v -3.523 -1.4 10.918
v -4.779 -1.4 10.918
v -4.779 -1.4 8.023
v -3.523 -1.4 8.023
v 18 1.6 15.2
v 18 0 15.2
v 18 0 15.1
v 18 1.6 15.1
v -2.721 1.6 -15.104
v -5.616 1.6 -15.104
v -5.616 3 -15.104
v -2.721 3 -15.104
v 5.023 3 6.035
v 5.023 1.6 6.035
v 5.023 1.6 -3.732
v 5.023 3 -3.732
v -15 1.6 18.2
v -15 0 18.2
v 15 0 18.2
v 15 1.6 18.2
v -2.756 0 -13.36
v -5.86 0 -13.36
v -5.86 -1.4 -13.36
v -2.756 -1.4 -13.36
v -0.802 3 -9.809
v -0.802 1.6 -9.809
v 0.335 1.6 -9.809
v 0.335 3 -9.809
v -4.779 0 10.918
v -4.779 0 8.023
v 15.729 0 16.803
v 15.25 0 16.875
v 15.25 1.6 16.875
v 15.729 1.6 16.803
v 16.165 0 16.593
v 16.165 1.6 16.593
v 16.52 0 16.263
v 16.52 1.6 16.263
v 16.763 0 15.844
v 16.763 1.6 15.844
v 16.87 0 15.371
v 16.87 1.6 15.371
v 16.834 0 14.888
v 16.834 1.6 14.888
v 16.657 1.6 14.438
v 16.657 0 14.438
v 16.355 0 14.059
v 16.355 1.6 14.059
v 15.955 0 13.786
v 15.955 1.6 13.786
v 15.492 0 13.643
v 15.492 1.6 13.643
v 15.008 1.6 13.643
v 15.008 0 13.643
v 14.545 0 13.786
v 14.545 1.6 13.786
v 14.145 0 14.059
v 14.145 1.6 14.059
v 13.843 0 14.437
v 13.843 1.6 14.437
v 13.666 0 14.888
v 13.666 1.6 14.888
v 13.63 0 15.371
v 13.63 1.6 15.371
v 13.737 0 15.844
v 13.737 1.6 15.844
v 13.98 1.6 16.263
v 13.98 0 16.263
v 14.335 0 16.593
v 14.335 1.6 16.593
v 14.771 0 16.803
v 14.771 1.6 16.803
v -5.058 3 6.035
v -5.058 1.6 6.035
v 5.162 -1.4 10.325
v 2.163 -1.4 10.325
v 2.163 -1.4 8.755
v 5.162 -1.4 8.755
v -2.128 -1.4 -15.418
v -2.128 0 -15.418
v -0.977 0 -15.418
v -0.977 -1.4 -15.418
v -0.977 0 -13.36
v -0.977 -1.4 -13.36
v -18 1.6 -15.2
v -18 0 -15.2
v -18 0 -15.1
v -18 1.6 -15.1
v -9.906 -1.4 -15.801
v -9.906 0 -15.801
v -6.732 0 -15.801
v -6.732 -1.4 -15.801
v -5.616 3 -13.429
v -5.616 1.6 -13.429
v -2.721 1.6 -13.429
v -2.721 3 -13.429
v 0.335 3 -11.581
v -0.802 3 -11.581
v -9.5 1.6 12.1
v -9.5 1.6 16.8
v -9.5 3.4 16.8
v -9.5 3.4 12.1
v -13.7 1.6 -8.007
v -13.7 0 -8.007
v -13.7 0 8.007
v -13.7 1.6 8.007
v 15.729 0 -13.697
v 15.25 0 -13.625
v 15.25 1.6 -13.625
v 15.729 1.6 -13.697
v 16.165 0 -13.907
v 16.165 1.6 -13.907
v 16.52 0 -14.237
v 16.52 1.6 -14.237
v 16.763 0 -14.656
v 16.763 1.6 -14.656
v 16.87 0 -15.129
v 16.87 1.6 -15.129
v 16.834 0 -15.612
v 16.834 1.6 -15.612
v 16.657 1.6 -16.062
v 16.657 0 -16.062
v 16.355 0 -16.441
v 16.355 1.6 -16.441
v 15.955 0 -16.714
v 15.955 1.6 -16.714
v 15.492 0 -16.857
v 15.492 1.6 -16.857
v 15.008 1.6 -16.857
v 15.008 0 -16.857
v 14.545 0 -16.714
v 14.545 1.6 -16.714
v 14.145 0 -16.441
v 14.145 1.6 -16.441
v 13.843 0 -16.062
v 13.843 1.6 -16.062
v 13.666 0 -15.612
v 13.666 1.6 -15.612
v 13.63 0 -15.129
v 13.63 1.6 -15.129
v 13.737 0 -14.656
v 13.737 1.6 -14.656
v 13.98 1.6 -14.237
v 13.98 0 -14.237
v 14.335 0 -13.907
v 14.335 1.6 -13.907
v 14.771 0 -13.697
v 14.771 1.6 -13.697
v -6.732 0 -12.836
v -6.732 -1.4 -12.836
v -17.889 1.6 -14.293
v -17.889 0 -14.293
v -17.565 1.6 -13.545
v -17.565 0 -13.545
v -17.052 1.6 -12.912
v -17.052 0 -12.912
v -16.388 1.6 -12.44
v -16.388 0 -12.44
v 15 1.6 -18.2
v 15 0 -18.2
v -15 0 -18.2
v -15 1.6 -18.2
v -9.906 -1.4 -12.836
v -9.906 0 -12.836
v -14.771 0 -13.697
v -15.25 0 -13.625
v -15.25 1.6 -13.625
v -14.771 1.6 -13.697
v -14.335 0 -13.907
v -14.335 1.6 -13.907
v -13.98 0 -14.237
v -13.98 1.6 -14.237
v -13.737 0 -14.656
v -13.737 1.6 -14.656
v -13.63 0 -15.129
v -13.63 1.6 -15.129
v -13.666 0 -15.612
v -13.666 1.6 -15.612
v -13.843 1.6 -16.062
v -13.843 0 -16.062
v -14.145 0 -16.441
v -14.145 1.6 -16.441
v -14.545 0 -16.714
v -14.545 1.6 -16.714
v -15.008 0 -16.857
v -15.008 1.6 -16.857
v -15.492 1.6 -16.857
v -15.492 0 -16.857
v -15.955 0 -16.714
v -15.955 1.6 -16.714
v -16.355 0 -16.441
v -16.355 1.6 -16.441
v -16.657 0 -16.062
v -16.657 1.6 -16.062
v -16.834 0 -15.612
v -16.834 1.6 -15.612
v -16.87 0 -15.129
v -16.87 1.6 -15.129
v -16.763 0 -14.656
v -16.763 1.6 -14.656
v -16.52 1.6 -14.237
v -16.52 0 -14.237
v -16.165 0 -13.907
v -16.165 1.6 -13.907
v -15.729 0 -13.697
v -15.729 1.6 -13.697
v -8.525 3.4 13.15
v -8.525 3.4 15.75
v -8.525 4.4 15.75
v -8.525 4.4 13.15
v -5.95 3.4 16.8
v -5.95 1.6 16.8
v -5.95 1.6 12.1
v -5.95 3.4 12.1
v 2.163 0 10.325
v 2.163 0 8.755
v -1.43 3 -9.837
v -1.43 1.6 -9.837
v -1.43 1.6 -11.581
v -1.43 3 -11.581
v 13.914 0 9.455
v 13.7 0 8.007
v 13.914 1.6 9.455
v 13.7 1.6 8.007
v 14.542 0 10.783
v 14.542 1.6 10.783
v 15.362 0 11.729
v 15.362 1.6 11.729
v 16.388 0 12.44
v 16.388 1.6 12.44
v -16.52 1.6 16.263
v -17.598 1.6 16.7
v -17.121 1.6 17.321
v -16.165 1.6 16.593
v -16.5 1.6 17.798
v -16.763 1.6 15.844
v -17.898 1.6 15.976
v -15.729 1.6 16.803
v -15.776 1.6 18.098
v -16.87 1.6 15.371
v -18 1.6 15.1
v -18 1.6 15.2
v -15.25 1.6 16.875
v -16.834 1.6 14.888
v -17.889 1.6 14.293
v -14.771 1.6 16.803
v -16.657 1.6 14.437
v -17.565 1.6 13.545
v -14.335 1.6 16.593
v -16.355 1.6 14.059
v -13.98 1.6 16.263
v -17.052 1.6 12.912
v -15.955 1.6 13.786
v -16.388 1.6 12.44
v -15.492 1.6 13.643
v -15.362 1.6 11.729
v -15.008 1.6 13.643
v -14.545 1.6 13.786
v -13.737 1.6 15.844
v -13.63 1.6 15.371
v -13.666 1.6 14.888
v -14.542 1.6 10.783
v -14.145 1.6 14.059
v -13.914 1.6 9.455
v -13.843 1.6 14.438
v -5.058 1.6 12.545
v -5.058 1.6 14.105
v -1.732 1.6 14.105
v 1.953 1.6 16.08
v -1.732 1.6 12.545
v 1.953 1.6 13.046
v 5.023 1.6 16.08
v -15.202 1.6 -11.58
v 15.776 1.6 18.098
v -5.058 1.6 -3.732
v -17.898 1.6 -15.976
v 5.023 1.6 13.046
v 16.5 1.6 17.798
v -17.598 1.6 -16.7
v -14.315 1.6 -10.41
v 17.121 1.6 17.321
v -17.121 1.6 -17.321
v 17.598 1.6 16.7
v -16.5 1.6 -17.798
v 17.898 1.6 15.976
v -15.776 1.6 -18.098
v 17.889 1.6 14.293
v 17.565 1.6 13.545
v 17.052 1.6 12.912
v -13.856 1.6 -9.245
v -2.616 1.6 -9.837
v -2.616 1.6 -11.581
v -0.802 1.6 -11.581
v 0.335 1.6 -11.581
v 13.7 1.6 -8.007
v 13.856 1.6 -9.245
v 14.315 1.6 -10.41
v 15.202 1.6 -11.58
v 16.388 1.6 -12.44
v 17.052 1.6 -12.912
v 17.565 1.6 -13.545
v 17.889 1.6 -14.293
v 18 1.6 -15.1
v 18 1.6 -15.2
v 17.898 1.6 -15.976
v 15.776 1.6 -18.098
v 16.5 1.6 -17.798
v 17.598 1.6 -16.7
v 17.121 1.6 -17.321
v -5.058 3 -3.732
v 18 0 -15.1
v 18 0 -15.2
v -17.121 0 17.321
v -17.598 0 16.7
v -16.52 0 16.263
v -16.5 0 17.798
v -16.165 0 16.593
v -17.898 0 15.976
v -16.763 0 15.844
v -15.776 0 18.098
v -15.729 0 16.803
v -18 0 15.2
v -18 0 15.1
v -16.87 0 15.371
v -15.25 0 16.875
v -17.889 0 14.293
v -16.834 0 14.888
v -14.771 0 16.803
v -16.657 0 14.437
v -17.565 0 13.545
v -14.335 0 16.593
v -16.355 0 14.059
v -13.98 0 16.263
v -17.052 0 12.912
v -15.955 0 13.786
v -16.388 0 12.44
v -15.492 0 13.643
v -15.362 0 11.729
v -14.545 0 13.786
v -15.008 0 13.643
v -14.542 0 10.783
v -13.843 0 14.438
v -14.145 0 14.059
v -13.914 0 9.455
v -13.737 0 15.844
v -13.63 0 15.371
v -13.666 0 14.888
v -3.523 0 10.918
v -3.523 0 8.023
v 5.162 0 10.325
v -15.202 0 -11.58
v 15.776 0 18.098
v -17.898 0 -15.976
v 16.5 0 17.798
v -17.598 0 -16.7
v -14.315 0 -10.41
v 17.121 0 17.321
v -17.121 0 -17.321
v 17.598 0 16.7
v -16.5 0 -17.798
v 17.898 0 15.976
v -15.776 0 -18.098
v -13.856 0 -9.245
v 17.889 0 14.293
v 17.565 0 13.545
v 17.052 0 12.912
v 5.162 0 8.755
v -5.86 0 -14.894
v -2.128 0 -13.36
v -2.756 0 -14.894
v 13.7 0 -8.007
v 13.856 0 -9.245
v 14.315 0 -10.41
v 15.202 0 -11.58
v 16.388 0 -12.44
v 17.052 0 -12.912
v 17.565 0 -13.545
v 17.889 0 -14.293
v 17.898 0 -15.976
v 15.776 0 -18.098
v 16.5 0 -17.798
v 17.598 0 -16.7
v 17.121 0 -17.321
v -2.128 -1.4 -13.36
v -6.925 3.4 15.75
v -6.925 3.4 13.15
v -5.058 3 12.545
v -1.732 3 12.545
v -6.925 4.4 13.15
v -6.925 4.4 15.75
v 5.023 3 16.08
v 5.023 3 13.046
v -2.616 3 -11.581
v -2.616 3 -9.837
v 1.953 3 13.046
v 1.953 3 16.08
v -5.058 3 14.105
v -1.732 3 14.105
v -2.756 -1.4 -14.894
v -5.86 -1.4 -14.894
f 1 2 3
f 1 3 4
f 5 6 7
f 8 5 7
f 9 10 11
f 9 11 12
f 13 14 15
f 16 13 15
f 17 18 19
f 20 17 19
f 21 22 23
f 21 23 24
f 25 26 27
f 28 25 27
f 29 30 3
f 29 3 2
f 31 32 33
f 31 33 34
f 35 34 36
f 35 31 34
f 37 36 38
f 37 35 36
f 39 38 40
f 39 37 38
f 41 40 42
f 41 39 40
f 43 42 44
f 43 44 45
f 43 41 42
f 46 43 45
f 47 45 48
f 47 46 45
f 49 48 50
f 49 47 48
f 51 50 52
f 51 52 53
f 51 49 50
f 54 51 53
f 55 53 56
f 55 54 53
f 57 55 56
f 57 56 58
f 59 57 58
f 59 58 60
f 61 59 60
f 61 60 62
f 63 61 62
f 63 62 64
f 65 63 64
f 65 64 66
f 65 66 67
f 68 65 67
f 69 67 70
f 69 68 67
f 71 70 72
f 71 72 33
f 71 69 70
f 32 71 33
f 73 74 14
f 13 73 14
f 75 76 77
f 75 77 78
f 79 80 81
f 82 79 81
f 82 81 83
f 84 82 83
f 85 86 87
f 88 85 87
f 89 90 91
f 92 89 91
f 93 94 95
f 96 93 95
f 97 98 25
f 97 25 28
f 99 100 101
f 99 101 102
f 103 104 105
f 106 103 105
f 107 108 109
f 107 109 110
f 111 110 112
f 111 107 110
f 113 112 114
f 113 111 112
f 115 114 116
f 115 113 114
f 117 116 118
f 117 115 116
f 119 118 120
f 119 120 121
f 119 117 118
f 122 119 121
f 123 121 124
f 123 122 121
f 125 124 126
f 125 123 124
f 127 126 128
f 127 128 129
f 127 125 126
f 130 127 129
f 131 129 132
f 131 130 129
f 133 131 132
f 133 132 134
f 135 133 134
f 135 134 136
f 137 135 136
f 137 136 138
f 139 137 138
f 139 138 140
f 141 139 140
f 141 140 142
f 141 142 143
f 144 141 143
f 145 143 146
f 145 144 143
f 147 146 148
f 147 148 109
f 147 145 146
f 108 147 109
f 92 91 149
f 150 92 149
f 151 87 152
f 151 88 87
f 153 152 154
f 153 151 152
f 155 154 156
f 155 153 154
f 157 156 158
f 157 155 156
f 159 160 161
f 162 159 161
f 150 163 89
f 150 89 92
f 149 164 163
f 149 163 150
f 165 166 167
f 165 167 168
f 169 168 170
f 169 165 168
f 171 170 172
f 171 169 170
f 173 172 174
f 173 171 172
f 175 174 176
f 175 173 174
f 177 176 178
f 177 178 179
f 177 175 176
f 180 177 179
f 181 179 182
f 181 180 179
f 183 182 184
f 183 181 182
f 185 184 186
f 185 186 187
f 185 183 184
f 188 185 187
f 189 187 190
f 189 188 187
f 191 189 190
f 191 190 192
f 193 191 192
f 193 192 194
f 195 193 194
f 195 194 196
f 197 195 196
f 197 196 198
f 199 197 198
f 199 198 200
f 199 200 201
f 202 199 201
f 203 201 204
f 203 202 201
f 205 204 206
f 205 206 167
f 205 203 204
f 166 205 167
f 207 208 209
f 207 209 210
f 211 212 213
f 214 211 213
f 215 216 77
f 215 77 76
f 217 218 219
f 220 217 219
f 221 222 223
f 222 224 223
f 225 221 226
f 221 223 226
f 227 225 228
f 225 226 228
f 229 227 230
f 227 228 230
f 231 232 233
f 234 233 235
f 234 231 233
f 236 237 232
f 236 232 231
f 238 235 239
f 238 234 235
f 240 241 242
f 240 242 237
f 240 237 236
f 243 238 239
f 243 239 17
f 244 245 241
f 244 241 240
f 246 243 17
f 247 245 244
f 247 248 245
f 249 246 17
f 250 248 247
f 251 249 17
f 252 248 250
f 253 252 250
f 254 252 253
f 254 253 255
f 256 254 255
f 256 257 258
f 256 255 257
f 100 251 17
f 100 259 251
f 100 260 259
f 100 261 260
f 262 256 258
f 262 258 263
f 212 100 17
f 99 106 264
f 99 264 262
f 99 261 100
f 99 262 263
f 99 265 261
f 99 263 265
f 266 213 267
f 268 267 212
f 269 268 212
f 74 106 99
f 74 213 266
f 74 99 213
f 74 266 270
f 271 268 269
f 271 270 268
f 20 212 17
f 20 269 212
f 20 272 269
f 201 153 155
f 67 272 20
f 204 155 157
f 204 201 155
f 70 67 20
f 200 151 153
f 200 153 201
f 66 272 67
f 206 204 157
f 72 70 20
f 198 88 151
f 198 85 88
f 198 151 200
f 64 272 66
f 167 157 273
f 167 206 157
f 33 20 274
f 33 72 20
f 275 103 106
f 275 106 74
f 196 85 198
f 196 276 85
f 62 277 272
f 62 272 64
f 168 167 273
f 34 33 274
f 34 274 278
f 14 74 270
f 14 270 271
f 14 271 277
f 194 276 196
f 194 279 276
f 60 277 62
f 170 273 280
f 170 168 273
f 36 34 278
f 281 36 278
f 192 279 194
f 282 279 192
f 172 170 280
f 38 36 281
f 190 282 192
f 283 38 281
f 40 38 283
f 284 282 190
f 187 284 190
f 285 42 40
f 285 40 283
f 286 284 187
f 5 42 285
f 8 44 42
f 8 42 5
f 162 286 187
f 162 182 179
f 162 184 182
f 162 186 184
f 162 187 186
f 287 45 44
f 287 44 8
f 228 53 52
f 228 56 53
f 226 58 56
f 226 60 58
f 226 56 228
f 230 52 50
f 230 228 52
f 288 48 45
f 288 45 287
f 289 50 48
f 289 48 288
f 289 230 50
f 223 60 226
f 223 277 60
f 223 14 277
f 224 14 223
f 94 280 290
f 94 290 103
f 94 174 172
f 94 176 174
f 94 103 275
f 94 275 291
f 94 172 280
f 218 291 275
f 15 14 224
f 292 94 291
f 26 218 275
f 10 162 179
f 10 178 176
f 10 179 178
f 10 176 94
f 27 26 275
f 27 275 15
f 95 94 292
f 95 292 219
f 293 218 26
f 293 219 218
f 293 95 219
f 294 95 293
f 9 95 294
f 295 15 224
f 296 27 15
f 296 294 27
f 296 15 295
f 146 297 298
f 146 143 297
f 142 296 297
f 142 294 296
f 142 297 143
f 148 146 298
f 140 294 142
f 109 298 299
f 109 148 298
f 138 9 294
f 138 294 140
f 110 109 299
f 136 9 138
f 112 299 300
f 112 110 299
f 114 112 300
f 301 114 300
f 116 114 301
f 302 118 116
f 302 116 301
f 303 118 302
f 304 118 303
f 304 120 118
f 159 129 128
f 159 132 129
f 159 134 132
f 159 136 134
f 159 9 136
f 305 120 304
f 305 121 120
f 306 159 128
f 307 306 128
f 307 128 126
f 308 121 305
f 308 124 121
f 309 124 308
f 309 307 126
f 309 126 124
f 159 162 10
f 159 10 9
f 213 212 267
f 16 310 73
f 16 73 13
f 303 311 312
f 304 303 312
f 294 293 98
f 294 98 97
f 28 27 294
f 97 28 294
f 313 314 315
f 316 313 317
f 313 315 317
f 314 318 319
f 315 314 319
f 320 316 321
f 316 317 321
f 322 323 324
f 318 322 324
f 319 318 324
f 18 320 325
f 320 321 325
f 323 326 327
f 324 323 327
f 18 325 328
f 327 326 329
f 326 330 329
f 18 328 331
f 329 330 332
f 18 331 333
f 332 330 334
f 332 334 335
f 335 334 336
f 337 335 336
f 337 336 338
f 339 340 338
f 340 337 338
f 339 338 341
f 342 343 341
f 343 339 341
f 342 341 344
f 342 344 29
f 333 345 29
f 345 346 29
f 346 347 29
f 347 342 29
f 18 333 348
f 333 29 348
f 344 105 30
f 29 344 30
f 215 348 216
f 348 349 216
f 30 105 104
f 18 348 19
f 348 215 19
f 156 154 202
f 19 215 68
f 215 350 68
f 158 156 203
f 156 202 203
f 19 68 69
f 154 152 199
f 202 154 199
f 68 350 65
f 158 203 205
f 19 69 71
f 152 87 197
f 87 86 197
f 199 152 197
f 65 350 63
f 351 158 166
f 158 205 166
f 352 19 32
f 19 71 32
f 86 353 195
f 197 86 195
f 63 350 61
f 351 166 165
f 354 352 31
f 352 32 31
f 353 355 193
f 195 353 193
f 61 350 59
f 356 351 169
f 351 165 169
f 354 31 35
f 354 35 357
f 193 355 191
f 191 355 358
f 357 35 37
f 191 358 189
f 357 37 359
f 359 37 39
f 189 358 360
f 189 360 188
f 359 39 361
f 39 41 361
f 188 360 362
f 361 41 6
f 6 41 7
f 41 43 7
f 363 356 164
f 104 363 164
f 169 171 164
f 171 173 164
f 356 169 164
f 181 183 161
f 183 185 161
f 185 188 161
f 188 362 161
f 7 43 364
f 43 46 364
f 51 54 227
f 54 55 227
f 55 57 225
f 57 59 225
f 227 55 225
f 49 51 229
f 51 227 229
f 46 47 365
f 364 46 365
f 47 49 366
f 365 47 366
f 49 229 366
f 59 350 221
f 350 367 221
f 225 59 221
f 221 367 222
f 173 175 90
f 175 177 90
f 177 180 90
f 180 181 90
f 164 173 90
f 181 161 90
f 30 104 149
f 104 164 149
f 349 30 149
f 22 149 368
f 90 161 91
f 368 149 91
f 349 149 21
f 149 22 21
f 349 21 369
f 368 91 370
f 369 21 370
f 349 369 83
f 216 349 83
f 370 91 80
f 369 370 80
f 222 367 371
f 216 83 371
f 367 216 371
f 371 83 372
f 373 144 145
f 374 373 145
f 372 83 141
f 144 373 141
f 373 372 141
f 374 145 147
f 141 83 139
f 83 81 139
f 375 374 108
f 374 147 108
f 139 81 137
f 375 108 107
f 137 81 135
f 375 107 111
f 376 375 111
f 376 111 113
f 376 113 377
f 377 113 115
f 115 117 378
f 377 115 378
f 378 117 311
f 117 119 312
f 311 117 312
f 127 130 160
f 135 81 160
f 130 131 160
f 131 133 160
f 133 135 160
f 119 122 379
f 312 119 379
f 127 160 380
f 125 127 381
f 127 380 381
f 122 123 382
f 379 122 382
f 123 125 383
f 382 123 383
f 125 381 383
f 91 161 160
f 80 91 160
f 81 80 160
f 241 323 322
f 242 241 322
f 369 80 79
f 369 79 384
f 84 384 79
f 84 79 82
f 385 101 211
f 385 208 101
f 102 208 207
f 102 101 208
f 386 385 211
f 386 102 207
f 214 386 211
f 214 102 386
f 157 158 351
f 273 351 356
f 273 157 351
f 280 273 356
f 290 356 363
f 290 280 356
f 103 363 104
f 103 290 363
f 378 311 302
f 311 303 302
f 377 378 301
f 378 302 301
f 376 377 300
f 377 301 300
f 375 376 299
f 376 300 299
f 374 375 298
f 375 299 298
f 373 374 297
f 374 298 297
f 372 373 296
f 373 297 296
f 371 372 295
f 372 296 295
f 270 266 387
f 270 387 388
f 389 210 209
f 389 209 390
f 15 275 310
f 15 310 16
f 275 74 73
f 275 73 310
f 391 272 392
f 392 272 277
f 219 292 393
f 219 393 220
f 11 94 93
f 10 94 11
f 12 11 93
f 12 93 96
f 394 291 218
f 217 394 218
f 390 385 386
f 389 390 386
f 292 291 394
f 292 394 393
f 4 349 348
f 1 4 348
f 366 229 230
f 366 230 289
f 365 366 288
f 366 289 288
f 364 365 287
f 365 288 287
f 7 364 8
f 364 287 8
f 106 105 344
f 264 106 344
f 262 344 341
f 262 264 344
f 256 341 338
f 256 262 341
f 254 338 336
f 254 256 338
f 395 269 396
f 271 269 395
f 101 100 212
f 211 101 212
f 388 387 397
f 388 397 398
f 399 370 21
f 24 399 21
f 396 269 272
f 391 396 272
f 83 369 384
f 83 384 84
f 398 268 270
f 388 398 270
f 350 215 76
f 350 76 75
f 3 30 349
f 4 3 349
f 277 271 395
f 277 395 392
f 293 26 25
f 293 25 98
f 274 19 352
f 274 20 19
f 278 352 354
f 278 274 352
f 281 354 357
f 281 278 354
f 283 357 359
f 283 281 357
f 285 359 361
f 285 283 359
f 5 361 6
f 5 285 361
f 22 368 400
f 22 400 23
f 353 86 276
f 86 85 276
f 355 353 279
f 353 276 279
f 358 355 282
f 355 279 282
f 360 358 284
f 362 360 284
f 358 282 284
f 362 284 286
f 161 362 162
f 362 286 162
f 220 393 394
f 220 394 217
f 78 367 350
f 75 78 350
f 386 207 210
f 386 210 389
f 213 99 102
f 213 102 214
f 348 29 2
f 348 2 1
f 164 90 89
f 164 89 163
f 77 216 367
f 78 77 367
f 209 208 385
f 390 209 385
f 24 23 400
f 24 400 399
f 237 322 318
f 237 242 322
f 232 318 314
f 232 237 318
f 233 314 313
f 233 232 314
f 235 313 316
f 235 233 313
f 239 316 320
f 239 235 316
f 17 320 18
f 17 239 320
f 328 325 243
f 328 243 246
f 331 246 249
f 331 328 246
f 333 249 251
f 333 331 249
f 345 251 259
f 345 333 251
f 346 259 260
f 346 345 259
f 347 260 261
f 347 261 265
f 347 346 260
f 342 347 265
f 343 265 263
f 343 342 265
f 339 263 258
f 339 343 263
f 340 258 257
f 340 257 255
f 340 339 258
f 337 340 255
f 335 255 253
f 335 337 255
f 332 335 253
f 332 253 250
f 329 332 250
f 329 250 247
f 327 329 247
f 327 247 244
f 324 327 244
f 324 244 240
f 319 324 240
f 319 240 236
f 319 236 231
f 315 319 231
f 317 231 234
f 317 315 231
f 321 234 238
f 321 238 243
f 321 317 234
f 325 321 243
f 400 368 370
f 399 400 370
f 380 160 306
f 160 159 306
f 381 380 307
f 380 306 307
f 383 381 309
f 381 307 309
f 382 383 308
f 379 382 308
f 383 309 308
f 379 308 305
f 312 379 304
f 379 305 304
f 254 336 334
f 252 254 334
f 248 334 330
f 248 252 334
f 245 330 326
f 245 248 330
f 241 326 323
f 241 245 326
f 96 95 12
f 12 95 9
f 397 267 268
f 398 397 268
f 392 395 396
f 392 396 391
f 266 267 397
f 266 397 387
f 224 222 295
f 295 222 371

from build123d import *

# Parameters (mm, degrees)
SKETCH1_R             = 1.625
PCB_DEPTH             = 1.6
SKETCH2_W             = 10.080807645
SKETCH2_H             = 9.766872459
SKETCH2_W_2           = 3.069588487
SKETCH2_H_2           = 3.0347068
SKETCH2_W_3           = 2.89518005
SKETCH2_H_3           = 1.674320993
SKETCH2_W_4           = 1.18597737
SKETCH2_H_4           = 1.744084367
SKETCH2_W_5           = 1.137538121
SKETCH2_H_5           = 1.77179178
SKETCH2_W_6           = 3.325937142
SKETCH2_H_6           = 1.560165557
TOP_COMPONENTS_DEPTH  = 1.4
FILLET1_R             = 3
FILLET2_R             = 5
SKETCH3_W             = 3.174233549
SKETCH3_H             = 2.964943425
SKETCH3_W_2           = 3.104470174
SKETCH3_H_2           = 1.534794244
SKETCH3_W_3           = 2.999825112
SKETCH3_H_3           = 1.569675931
SKETCH3_W_4           = 1.255740744
SKETCH3_H_4           = 2.895180051
SKETCH3_W_5           = 1.151095683
SKETCH3_H_5           = 2.058019554
REAR_COMPONENTS_DEPTH = 1.4
SKETCH4_W             = 3.55
SKETCH4_H             = 4.7
BUTTON_BASE_DEPTH     = 1.8
SKETCH5_W             = 1.6
SKETCH5_H             = 2.6
BUTTON_TIP_DEPTH      = 1


with BuildPart() as part:
    # Sketch1 → PCB (new body)
    with BuildSketch(Plane(origin=(0, 0, 0), x_dir=(1, 0, 0), z_dir=(0, 1, 0))):
        Polygon((-18, 18.2), (-18, 12.1), (-13.7, 12.1), (-13.7, -12.1), (-18, -12.1), (-18, -18.2), (18, -18.2), (18, -12.1), (13.7, -12.1), (13.7, 12.1), (18, 12.1), (18, 18.2), align=None)
        with Locations(Location((15.25, -15.25, 0), (0, 0, 270))):
            Circle(SKETCH1_R, mode=Mode.SUBTRACT)
        with Locations(Location((15.25, 15.25, 0), (0, 0, 270))):
            Circle(SKETCH1_R, mode=Mode.SUBTRACT)
        with Locations(Location((-15.25, 15.25, 0), (0, 0, 270))):
            Circle(SKETCH1_R, mode=Mode.SUBTRACT)
        with Locations(Location((-15.25, -15.25, 0), (0, 0, 270))):
            Circle(SKETCH1_R, mode=Mode.SUBTRACT)
    extrude(amount=PCB_DEPTH)

    # Sketch2 → Top components (add)
    with BuildSketch(Plane(origin=(0, 1.6, 0), x_dir=(1, 0, 0), z_dir=(0, 1, 0))):
        with Locations((-0.017440844, -1.151095683)):
            Rectangle(SKETCH2_W, SKETCH2_H)
        with Locations((3.488168735, -14.56310447)):
            Rectangle(SKETCH2_W_2, SKETCH2_H_2)
        with Locations((-4.168361639, 14.266610128)):
            Rectangle(SKETCH2_W_3, SKETCH2_H_3)
        with Locations((-2.023137867, 10.708678018)):
            Rectangle(SKETCH2_W_4, SKETCH2_H_4)
        with Locations((-0.233509749, 10.694824311)):
            Rectangle(SKETCH2_W_5, SKETCH2_H_5)
        with Locations((-3.394876095, -13.324858297)):
            Rectangle(SKETCH2_W_6, SKETCH2_H_6)
    extrude(amount=TOP_COMPONENTS_DEPTH)

    # Fillet1
    fillet1_edges = [part.edges().sort_by_distance(p)[0] for p in [
        (-18, 0.8, 18.2),
        (-18, 0.8, 12.1),
        (-18, 0.8, -12.1),
        (-18, 0.8, -18.2),
        (18, 0.8, -18.2),
        (18, 0.8, -12.1),
        (18, 0.8, 12.1),
        (18, 0.8, 18.2),
    ]]
    fillet(fillet1_edges, radius=FILLET1_R)

    # Fillet2
    fillet2_edges = [part.edges().sort_by_distance(p)[0] for p in [
        (13.7, 0.8, -12.1),
        (13.7, 0.8, 12.1),
        (-13.7, 0.8, 12.1),
        (-13.7, 0.8, -12.1),
    ]]
    fillet(fillet2_edges, radius=FILLET2_R)

    # Sketch3 → Rear components (add)
    with BuildSketch(Plane.XZ):
        with Locations((-8.319282433, -14.318932658)):
            Rectangle(SKETCH3_W, SKETCH3_H)
        with Locations((-4.307888388, -14.127083378)):
            Rectangle(SKETCH3_W_2, SKETCH3_H_2)
        with Locations((3.662577172, 9.540141492)):
            Rectangle(SKETCH3_W_3, SKETCH3_H_3)
        with Locations((-4.150920795, 9.470378117)):
            Rectangle(SKETCH3_W_4, SKETCH3_H_4)
        with Locations((-1.552235088, -14.388696033)):
            Rectangle(SKETCH3_W_5, SKETCH3_H_5)
    extrude(amount=REAR_COMPONENTS_DEPTH)

    # Sketch4 → Button base (add)
    with BuildSketch(Plane(origin=(0, 1.6, 0), x_dir=(1, 0, 0), z_dir=(0, 1, 0))):
        with Locations((-7.725, -14.45)):
            Rectangle(SKETCH4_W, SKETCH4_H)
    extrude(amount=BUTTON_BASE_DEPTH)

    # Sketch5 → Button tip (add)
    with BuildSketch(Plane(origin=(0, 3.4, 0), x_dir=(1, 0, 0), z_dir=(0, 1, 0))):
        with Locations((-7.725, -14.45)):
            Rectangle(SKETCH5_W, SKETCH5_H)
    extrude(amount=BUTTON_TIP_DEPTH)


solid = part.part
